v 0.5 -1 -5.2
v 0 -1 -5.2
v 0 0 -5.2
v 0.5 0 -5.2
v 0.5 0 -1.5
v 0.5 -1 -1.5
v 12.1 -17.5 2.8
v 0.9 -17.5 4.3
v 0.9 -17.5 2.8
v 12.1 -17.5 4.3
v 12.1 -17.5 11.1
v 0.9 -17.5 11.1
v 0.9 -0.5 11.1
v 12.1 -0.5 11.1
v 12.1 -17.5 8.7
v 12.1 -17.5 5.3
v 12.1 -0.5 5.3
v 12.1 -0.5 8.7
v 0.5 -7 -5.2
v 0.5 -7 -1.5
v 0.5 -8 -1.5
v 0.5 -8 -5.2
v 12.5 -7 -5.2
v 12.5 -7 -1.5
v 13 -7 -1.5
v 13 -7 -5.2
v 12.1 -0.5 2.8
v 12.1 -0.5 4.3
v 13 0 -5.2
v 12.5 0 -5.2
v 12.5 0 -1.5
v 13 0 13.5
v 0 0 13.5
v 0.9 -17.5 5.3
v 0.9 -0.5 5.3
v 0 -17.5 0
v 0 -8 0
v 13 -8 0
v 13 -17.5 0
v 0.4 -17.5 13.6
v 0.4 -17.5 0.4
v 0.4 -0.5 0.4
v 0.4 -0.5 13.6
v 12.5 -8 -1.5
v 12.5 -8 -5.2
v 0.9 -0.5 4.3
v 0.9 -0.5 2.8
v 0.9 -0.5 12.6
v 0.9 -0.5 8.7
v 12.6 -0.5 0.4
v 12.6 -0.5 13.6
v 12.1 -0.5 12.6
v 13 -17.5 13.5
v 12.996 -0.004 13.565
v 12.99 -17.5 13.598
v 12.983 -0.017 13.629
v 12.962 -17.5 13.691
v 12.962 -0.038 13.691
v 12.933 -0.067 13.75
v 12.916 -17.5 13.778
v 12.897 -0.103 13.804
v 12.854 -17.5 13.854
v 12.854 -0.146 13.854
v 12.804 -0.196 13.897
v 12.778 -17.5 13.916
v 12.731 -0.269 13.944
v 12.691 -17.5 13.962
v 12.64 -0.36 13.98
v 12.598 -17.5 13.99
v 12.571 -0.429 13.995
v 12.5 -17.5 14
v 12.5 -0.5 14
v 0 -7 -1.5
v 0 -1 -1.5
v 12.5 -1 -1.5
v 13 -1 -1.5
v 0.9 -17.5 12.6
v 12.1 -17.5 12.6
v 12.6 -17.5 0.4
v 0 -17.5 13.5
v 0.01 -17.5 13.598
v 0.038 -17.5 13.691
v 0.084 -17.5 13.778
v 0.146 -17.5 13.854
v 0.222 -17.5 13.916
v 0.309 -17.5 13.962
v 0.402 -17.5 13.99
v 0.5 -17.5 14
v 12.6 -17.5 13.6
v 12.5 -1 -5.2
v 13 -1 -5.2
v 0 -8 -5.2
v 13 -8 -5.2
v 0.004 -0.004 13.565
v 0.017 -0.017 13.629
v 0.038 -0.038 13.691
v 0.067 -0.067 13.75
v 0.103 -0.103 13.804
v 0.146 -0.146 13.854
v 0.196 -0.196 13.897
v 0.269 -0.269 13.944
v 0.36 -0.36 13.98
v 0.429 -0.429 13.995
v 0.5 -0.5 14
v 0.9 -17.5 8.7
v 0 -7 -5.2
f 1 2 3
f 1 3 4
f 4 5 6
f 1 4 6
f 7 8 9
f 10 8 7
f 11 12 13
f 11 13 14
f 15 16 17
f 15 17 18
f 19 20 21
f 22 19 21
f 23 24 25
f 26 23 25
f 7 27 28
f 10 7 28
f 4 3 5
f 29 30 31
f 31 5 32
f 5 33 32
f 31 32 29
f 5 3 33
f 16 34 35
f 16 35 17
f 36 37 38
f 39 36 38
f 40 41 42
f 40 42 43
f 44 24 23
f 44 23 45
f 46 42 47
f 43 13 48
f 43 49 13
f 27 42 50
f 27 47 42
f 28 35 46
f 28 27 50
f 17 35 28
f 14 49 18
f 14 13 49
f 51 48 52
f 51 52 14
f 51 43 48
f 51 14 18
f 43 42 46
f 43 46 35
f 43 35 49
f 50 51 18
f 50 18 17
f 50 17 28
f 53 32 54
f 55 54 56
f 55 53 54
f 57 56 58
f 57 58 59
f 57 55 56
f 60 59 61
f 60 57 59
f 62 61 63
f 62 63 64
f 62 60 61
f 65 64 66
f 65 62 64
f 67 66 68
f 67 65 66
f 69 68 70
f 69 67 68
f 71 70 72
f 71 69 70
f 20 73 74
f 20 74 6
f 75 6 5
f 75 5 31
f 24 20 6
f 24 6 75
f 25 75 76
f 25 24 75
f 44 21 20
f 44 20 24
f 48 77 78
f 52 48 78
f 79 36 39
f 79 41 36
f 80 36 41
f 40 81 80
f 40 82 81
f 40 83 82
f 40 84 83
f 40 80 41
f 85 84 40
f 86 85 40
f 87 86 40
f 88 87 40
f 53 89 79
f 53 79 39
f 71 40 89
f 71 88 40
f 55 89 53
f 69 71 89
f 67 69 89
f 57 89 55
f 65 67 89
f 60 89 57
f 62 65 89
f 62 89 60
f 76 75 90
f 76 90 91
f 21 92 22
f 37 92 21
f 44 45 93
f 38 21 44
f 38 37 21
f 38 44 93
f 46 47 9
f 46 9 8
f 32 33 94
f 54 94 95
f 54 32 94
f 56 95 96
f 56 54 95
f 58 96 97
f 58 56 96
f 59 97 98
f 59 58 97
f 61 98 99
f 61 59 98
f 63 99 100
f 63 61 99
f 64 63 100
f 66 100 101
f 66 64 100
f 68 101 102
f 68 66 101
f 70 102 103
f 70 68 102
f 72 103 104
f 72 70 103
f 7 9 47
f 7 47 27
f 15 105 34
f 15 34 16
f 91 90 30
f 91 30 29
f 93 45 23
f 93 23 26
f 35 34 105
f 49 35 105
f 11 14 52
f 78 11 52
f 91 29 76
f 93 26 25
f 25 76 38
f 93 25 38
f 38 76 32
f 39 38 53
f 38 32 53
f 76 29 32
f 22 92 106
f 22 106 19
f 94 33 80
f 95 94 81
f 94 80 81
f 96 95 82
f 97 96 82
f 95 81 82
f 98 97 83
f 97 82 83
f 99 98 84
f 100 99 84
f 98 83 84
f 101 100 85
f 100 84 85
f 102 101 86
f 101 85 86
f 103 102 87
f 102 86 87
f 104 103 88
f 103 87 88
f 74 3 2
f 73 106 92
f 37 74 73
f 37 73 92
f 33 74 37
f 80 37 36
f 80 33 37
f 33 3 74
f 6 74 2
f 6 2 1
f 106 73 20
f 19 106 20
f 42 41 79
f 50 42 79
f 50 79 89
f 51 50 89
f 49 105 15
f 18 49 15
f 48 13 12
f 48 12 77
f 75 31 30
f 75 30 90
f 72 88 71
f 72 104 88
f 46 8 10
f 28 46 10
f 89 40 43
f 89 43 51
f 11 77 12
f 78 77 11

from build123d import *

# Parameters (mm, degrees)
F0_W     = 13
F0_H     = 14
F1_DEPTH = 17.5
F2_W     = 12.2
F2_H     = 13.2
F2_W_2   = 11.2
F2_H_2   = 1.5
F2_H_3   = 3.4
F3_DEPTH = 17
F4_W     = 13
F4_H     = 8
F5_DEPTH = 1.5
F6_W     = 0.5
F6_H     = 1
F7_DEPTH = 3.7
F8_R     = 0.5


with BuildPart() as f1:
    # F0 (on Front) → F1 (new body)
    with BuildSketch(Plane.XZ):
        with Locations((6.5, 7)):
            Rectangle(F0_W, F0_H)
    extrude(amount=F1_DEPTH)

    # F2 (on face) → F3 (cut)
    with BuildSketch(Plane.XZ.offset(17.5)):
        with Locations((6.5, 7)):
            Rectangle(F2_W, F2_H)
        with Locations((6.5, 3.55)):
            Rectangle(F2_W_2, F2_H_2, mode=Mode.SUBTRACT)
        with Locations((6.5, 7)):
            Rectangle(F2_W_2, F2_H_3, mode=Mode.SUBTRACT)
        with Locations((6.5, 11.85)):
            Rectangle(F2_W_2, F2_H_2, mode=Mode.SUBTRACT)
    extrude(amount=-F3_DEPTH, mode=Mode.SUBTRACT)

    # F4 (on face) → F5 (join)
    with BuildSketch(Plane(origin=(0, 0, 0), x_dir=(1, 0, 0), z_dir=(0, 0, -1))):
        with Locations((6.5, 4)):
            Rectangle(F4_W, F4_H)
    extrude(amount=F5_DEPTH)

    # F6 (on face) → F7 (join)
    with BuildSketch(Plane(origin=(0, 0, -1.5), x_dir=(1, 0, 0), z_dir=(0, 0, -1))):
        with Locations((0.25, 7.5)):
            Rectangle(F6_W, F6_H)
        with Locations((0.25, 0.5)):
            Rectangle(F6_W, F6_H)
        with Locations((12.75, 7.5)):
            Rectangle(F6_W, F6_H)
        with Locations((12.75, 0.5)):
            Rectangle(F6_W, F6_H)
    extrude(amount=F7_DEPTH)

    # F8
    f8_edges = [f1.edges().sort_by_distance(p)[0] for p in [
        (13, -8.75, 14),
        (6.5, 0, 14),
        (0, -8.75, 14),
    ]]
    fillet(f8_edges, radius=F8_R)


solid = f1.part
